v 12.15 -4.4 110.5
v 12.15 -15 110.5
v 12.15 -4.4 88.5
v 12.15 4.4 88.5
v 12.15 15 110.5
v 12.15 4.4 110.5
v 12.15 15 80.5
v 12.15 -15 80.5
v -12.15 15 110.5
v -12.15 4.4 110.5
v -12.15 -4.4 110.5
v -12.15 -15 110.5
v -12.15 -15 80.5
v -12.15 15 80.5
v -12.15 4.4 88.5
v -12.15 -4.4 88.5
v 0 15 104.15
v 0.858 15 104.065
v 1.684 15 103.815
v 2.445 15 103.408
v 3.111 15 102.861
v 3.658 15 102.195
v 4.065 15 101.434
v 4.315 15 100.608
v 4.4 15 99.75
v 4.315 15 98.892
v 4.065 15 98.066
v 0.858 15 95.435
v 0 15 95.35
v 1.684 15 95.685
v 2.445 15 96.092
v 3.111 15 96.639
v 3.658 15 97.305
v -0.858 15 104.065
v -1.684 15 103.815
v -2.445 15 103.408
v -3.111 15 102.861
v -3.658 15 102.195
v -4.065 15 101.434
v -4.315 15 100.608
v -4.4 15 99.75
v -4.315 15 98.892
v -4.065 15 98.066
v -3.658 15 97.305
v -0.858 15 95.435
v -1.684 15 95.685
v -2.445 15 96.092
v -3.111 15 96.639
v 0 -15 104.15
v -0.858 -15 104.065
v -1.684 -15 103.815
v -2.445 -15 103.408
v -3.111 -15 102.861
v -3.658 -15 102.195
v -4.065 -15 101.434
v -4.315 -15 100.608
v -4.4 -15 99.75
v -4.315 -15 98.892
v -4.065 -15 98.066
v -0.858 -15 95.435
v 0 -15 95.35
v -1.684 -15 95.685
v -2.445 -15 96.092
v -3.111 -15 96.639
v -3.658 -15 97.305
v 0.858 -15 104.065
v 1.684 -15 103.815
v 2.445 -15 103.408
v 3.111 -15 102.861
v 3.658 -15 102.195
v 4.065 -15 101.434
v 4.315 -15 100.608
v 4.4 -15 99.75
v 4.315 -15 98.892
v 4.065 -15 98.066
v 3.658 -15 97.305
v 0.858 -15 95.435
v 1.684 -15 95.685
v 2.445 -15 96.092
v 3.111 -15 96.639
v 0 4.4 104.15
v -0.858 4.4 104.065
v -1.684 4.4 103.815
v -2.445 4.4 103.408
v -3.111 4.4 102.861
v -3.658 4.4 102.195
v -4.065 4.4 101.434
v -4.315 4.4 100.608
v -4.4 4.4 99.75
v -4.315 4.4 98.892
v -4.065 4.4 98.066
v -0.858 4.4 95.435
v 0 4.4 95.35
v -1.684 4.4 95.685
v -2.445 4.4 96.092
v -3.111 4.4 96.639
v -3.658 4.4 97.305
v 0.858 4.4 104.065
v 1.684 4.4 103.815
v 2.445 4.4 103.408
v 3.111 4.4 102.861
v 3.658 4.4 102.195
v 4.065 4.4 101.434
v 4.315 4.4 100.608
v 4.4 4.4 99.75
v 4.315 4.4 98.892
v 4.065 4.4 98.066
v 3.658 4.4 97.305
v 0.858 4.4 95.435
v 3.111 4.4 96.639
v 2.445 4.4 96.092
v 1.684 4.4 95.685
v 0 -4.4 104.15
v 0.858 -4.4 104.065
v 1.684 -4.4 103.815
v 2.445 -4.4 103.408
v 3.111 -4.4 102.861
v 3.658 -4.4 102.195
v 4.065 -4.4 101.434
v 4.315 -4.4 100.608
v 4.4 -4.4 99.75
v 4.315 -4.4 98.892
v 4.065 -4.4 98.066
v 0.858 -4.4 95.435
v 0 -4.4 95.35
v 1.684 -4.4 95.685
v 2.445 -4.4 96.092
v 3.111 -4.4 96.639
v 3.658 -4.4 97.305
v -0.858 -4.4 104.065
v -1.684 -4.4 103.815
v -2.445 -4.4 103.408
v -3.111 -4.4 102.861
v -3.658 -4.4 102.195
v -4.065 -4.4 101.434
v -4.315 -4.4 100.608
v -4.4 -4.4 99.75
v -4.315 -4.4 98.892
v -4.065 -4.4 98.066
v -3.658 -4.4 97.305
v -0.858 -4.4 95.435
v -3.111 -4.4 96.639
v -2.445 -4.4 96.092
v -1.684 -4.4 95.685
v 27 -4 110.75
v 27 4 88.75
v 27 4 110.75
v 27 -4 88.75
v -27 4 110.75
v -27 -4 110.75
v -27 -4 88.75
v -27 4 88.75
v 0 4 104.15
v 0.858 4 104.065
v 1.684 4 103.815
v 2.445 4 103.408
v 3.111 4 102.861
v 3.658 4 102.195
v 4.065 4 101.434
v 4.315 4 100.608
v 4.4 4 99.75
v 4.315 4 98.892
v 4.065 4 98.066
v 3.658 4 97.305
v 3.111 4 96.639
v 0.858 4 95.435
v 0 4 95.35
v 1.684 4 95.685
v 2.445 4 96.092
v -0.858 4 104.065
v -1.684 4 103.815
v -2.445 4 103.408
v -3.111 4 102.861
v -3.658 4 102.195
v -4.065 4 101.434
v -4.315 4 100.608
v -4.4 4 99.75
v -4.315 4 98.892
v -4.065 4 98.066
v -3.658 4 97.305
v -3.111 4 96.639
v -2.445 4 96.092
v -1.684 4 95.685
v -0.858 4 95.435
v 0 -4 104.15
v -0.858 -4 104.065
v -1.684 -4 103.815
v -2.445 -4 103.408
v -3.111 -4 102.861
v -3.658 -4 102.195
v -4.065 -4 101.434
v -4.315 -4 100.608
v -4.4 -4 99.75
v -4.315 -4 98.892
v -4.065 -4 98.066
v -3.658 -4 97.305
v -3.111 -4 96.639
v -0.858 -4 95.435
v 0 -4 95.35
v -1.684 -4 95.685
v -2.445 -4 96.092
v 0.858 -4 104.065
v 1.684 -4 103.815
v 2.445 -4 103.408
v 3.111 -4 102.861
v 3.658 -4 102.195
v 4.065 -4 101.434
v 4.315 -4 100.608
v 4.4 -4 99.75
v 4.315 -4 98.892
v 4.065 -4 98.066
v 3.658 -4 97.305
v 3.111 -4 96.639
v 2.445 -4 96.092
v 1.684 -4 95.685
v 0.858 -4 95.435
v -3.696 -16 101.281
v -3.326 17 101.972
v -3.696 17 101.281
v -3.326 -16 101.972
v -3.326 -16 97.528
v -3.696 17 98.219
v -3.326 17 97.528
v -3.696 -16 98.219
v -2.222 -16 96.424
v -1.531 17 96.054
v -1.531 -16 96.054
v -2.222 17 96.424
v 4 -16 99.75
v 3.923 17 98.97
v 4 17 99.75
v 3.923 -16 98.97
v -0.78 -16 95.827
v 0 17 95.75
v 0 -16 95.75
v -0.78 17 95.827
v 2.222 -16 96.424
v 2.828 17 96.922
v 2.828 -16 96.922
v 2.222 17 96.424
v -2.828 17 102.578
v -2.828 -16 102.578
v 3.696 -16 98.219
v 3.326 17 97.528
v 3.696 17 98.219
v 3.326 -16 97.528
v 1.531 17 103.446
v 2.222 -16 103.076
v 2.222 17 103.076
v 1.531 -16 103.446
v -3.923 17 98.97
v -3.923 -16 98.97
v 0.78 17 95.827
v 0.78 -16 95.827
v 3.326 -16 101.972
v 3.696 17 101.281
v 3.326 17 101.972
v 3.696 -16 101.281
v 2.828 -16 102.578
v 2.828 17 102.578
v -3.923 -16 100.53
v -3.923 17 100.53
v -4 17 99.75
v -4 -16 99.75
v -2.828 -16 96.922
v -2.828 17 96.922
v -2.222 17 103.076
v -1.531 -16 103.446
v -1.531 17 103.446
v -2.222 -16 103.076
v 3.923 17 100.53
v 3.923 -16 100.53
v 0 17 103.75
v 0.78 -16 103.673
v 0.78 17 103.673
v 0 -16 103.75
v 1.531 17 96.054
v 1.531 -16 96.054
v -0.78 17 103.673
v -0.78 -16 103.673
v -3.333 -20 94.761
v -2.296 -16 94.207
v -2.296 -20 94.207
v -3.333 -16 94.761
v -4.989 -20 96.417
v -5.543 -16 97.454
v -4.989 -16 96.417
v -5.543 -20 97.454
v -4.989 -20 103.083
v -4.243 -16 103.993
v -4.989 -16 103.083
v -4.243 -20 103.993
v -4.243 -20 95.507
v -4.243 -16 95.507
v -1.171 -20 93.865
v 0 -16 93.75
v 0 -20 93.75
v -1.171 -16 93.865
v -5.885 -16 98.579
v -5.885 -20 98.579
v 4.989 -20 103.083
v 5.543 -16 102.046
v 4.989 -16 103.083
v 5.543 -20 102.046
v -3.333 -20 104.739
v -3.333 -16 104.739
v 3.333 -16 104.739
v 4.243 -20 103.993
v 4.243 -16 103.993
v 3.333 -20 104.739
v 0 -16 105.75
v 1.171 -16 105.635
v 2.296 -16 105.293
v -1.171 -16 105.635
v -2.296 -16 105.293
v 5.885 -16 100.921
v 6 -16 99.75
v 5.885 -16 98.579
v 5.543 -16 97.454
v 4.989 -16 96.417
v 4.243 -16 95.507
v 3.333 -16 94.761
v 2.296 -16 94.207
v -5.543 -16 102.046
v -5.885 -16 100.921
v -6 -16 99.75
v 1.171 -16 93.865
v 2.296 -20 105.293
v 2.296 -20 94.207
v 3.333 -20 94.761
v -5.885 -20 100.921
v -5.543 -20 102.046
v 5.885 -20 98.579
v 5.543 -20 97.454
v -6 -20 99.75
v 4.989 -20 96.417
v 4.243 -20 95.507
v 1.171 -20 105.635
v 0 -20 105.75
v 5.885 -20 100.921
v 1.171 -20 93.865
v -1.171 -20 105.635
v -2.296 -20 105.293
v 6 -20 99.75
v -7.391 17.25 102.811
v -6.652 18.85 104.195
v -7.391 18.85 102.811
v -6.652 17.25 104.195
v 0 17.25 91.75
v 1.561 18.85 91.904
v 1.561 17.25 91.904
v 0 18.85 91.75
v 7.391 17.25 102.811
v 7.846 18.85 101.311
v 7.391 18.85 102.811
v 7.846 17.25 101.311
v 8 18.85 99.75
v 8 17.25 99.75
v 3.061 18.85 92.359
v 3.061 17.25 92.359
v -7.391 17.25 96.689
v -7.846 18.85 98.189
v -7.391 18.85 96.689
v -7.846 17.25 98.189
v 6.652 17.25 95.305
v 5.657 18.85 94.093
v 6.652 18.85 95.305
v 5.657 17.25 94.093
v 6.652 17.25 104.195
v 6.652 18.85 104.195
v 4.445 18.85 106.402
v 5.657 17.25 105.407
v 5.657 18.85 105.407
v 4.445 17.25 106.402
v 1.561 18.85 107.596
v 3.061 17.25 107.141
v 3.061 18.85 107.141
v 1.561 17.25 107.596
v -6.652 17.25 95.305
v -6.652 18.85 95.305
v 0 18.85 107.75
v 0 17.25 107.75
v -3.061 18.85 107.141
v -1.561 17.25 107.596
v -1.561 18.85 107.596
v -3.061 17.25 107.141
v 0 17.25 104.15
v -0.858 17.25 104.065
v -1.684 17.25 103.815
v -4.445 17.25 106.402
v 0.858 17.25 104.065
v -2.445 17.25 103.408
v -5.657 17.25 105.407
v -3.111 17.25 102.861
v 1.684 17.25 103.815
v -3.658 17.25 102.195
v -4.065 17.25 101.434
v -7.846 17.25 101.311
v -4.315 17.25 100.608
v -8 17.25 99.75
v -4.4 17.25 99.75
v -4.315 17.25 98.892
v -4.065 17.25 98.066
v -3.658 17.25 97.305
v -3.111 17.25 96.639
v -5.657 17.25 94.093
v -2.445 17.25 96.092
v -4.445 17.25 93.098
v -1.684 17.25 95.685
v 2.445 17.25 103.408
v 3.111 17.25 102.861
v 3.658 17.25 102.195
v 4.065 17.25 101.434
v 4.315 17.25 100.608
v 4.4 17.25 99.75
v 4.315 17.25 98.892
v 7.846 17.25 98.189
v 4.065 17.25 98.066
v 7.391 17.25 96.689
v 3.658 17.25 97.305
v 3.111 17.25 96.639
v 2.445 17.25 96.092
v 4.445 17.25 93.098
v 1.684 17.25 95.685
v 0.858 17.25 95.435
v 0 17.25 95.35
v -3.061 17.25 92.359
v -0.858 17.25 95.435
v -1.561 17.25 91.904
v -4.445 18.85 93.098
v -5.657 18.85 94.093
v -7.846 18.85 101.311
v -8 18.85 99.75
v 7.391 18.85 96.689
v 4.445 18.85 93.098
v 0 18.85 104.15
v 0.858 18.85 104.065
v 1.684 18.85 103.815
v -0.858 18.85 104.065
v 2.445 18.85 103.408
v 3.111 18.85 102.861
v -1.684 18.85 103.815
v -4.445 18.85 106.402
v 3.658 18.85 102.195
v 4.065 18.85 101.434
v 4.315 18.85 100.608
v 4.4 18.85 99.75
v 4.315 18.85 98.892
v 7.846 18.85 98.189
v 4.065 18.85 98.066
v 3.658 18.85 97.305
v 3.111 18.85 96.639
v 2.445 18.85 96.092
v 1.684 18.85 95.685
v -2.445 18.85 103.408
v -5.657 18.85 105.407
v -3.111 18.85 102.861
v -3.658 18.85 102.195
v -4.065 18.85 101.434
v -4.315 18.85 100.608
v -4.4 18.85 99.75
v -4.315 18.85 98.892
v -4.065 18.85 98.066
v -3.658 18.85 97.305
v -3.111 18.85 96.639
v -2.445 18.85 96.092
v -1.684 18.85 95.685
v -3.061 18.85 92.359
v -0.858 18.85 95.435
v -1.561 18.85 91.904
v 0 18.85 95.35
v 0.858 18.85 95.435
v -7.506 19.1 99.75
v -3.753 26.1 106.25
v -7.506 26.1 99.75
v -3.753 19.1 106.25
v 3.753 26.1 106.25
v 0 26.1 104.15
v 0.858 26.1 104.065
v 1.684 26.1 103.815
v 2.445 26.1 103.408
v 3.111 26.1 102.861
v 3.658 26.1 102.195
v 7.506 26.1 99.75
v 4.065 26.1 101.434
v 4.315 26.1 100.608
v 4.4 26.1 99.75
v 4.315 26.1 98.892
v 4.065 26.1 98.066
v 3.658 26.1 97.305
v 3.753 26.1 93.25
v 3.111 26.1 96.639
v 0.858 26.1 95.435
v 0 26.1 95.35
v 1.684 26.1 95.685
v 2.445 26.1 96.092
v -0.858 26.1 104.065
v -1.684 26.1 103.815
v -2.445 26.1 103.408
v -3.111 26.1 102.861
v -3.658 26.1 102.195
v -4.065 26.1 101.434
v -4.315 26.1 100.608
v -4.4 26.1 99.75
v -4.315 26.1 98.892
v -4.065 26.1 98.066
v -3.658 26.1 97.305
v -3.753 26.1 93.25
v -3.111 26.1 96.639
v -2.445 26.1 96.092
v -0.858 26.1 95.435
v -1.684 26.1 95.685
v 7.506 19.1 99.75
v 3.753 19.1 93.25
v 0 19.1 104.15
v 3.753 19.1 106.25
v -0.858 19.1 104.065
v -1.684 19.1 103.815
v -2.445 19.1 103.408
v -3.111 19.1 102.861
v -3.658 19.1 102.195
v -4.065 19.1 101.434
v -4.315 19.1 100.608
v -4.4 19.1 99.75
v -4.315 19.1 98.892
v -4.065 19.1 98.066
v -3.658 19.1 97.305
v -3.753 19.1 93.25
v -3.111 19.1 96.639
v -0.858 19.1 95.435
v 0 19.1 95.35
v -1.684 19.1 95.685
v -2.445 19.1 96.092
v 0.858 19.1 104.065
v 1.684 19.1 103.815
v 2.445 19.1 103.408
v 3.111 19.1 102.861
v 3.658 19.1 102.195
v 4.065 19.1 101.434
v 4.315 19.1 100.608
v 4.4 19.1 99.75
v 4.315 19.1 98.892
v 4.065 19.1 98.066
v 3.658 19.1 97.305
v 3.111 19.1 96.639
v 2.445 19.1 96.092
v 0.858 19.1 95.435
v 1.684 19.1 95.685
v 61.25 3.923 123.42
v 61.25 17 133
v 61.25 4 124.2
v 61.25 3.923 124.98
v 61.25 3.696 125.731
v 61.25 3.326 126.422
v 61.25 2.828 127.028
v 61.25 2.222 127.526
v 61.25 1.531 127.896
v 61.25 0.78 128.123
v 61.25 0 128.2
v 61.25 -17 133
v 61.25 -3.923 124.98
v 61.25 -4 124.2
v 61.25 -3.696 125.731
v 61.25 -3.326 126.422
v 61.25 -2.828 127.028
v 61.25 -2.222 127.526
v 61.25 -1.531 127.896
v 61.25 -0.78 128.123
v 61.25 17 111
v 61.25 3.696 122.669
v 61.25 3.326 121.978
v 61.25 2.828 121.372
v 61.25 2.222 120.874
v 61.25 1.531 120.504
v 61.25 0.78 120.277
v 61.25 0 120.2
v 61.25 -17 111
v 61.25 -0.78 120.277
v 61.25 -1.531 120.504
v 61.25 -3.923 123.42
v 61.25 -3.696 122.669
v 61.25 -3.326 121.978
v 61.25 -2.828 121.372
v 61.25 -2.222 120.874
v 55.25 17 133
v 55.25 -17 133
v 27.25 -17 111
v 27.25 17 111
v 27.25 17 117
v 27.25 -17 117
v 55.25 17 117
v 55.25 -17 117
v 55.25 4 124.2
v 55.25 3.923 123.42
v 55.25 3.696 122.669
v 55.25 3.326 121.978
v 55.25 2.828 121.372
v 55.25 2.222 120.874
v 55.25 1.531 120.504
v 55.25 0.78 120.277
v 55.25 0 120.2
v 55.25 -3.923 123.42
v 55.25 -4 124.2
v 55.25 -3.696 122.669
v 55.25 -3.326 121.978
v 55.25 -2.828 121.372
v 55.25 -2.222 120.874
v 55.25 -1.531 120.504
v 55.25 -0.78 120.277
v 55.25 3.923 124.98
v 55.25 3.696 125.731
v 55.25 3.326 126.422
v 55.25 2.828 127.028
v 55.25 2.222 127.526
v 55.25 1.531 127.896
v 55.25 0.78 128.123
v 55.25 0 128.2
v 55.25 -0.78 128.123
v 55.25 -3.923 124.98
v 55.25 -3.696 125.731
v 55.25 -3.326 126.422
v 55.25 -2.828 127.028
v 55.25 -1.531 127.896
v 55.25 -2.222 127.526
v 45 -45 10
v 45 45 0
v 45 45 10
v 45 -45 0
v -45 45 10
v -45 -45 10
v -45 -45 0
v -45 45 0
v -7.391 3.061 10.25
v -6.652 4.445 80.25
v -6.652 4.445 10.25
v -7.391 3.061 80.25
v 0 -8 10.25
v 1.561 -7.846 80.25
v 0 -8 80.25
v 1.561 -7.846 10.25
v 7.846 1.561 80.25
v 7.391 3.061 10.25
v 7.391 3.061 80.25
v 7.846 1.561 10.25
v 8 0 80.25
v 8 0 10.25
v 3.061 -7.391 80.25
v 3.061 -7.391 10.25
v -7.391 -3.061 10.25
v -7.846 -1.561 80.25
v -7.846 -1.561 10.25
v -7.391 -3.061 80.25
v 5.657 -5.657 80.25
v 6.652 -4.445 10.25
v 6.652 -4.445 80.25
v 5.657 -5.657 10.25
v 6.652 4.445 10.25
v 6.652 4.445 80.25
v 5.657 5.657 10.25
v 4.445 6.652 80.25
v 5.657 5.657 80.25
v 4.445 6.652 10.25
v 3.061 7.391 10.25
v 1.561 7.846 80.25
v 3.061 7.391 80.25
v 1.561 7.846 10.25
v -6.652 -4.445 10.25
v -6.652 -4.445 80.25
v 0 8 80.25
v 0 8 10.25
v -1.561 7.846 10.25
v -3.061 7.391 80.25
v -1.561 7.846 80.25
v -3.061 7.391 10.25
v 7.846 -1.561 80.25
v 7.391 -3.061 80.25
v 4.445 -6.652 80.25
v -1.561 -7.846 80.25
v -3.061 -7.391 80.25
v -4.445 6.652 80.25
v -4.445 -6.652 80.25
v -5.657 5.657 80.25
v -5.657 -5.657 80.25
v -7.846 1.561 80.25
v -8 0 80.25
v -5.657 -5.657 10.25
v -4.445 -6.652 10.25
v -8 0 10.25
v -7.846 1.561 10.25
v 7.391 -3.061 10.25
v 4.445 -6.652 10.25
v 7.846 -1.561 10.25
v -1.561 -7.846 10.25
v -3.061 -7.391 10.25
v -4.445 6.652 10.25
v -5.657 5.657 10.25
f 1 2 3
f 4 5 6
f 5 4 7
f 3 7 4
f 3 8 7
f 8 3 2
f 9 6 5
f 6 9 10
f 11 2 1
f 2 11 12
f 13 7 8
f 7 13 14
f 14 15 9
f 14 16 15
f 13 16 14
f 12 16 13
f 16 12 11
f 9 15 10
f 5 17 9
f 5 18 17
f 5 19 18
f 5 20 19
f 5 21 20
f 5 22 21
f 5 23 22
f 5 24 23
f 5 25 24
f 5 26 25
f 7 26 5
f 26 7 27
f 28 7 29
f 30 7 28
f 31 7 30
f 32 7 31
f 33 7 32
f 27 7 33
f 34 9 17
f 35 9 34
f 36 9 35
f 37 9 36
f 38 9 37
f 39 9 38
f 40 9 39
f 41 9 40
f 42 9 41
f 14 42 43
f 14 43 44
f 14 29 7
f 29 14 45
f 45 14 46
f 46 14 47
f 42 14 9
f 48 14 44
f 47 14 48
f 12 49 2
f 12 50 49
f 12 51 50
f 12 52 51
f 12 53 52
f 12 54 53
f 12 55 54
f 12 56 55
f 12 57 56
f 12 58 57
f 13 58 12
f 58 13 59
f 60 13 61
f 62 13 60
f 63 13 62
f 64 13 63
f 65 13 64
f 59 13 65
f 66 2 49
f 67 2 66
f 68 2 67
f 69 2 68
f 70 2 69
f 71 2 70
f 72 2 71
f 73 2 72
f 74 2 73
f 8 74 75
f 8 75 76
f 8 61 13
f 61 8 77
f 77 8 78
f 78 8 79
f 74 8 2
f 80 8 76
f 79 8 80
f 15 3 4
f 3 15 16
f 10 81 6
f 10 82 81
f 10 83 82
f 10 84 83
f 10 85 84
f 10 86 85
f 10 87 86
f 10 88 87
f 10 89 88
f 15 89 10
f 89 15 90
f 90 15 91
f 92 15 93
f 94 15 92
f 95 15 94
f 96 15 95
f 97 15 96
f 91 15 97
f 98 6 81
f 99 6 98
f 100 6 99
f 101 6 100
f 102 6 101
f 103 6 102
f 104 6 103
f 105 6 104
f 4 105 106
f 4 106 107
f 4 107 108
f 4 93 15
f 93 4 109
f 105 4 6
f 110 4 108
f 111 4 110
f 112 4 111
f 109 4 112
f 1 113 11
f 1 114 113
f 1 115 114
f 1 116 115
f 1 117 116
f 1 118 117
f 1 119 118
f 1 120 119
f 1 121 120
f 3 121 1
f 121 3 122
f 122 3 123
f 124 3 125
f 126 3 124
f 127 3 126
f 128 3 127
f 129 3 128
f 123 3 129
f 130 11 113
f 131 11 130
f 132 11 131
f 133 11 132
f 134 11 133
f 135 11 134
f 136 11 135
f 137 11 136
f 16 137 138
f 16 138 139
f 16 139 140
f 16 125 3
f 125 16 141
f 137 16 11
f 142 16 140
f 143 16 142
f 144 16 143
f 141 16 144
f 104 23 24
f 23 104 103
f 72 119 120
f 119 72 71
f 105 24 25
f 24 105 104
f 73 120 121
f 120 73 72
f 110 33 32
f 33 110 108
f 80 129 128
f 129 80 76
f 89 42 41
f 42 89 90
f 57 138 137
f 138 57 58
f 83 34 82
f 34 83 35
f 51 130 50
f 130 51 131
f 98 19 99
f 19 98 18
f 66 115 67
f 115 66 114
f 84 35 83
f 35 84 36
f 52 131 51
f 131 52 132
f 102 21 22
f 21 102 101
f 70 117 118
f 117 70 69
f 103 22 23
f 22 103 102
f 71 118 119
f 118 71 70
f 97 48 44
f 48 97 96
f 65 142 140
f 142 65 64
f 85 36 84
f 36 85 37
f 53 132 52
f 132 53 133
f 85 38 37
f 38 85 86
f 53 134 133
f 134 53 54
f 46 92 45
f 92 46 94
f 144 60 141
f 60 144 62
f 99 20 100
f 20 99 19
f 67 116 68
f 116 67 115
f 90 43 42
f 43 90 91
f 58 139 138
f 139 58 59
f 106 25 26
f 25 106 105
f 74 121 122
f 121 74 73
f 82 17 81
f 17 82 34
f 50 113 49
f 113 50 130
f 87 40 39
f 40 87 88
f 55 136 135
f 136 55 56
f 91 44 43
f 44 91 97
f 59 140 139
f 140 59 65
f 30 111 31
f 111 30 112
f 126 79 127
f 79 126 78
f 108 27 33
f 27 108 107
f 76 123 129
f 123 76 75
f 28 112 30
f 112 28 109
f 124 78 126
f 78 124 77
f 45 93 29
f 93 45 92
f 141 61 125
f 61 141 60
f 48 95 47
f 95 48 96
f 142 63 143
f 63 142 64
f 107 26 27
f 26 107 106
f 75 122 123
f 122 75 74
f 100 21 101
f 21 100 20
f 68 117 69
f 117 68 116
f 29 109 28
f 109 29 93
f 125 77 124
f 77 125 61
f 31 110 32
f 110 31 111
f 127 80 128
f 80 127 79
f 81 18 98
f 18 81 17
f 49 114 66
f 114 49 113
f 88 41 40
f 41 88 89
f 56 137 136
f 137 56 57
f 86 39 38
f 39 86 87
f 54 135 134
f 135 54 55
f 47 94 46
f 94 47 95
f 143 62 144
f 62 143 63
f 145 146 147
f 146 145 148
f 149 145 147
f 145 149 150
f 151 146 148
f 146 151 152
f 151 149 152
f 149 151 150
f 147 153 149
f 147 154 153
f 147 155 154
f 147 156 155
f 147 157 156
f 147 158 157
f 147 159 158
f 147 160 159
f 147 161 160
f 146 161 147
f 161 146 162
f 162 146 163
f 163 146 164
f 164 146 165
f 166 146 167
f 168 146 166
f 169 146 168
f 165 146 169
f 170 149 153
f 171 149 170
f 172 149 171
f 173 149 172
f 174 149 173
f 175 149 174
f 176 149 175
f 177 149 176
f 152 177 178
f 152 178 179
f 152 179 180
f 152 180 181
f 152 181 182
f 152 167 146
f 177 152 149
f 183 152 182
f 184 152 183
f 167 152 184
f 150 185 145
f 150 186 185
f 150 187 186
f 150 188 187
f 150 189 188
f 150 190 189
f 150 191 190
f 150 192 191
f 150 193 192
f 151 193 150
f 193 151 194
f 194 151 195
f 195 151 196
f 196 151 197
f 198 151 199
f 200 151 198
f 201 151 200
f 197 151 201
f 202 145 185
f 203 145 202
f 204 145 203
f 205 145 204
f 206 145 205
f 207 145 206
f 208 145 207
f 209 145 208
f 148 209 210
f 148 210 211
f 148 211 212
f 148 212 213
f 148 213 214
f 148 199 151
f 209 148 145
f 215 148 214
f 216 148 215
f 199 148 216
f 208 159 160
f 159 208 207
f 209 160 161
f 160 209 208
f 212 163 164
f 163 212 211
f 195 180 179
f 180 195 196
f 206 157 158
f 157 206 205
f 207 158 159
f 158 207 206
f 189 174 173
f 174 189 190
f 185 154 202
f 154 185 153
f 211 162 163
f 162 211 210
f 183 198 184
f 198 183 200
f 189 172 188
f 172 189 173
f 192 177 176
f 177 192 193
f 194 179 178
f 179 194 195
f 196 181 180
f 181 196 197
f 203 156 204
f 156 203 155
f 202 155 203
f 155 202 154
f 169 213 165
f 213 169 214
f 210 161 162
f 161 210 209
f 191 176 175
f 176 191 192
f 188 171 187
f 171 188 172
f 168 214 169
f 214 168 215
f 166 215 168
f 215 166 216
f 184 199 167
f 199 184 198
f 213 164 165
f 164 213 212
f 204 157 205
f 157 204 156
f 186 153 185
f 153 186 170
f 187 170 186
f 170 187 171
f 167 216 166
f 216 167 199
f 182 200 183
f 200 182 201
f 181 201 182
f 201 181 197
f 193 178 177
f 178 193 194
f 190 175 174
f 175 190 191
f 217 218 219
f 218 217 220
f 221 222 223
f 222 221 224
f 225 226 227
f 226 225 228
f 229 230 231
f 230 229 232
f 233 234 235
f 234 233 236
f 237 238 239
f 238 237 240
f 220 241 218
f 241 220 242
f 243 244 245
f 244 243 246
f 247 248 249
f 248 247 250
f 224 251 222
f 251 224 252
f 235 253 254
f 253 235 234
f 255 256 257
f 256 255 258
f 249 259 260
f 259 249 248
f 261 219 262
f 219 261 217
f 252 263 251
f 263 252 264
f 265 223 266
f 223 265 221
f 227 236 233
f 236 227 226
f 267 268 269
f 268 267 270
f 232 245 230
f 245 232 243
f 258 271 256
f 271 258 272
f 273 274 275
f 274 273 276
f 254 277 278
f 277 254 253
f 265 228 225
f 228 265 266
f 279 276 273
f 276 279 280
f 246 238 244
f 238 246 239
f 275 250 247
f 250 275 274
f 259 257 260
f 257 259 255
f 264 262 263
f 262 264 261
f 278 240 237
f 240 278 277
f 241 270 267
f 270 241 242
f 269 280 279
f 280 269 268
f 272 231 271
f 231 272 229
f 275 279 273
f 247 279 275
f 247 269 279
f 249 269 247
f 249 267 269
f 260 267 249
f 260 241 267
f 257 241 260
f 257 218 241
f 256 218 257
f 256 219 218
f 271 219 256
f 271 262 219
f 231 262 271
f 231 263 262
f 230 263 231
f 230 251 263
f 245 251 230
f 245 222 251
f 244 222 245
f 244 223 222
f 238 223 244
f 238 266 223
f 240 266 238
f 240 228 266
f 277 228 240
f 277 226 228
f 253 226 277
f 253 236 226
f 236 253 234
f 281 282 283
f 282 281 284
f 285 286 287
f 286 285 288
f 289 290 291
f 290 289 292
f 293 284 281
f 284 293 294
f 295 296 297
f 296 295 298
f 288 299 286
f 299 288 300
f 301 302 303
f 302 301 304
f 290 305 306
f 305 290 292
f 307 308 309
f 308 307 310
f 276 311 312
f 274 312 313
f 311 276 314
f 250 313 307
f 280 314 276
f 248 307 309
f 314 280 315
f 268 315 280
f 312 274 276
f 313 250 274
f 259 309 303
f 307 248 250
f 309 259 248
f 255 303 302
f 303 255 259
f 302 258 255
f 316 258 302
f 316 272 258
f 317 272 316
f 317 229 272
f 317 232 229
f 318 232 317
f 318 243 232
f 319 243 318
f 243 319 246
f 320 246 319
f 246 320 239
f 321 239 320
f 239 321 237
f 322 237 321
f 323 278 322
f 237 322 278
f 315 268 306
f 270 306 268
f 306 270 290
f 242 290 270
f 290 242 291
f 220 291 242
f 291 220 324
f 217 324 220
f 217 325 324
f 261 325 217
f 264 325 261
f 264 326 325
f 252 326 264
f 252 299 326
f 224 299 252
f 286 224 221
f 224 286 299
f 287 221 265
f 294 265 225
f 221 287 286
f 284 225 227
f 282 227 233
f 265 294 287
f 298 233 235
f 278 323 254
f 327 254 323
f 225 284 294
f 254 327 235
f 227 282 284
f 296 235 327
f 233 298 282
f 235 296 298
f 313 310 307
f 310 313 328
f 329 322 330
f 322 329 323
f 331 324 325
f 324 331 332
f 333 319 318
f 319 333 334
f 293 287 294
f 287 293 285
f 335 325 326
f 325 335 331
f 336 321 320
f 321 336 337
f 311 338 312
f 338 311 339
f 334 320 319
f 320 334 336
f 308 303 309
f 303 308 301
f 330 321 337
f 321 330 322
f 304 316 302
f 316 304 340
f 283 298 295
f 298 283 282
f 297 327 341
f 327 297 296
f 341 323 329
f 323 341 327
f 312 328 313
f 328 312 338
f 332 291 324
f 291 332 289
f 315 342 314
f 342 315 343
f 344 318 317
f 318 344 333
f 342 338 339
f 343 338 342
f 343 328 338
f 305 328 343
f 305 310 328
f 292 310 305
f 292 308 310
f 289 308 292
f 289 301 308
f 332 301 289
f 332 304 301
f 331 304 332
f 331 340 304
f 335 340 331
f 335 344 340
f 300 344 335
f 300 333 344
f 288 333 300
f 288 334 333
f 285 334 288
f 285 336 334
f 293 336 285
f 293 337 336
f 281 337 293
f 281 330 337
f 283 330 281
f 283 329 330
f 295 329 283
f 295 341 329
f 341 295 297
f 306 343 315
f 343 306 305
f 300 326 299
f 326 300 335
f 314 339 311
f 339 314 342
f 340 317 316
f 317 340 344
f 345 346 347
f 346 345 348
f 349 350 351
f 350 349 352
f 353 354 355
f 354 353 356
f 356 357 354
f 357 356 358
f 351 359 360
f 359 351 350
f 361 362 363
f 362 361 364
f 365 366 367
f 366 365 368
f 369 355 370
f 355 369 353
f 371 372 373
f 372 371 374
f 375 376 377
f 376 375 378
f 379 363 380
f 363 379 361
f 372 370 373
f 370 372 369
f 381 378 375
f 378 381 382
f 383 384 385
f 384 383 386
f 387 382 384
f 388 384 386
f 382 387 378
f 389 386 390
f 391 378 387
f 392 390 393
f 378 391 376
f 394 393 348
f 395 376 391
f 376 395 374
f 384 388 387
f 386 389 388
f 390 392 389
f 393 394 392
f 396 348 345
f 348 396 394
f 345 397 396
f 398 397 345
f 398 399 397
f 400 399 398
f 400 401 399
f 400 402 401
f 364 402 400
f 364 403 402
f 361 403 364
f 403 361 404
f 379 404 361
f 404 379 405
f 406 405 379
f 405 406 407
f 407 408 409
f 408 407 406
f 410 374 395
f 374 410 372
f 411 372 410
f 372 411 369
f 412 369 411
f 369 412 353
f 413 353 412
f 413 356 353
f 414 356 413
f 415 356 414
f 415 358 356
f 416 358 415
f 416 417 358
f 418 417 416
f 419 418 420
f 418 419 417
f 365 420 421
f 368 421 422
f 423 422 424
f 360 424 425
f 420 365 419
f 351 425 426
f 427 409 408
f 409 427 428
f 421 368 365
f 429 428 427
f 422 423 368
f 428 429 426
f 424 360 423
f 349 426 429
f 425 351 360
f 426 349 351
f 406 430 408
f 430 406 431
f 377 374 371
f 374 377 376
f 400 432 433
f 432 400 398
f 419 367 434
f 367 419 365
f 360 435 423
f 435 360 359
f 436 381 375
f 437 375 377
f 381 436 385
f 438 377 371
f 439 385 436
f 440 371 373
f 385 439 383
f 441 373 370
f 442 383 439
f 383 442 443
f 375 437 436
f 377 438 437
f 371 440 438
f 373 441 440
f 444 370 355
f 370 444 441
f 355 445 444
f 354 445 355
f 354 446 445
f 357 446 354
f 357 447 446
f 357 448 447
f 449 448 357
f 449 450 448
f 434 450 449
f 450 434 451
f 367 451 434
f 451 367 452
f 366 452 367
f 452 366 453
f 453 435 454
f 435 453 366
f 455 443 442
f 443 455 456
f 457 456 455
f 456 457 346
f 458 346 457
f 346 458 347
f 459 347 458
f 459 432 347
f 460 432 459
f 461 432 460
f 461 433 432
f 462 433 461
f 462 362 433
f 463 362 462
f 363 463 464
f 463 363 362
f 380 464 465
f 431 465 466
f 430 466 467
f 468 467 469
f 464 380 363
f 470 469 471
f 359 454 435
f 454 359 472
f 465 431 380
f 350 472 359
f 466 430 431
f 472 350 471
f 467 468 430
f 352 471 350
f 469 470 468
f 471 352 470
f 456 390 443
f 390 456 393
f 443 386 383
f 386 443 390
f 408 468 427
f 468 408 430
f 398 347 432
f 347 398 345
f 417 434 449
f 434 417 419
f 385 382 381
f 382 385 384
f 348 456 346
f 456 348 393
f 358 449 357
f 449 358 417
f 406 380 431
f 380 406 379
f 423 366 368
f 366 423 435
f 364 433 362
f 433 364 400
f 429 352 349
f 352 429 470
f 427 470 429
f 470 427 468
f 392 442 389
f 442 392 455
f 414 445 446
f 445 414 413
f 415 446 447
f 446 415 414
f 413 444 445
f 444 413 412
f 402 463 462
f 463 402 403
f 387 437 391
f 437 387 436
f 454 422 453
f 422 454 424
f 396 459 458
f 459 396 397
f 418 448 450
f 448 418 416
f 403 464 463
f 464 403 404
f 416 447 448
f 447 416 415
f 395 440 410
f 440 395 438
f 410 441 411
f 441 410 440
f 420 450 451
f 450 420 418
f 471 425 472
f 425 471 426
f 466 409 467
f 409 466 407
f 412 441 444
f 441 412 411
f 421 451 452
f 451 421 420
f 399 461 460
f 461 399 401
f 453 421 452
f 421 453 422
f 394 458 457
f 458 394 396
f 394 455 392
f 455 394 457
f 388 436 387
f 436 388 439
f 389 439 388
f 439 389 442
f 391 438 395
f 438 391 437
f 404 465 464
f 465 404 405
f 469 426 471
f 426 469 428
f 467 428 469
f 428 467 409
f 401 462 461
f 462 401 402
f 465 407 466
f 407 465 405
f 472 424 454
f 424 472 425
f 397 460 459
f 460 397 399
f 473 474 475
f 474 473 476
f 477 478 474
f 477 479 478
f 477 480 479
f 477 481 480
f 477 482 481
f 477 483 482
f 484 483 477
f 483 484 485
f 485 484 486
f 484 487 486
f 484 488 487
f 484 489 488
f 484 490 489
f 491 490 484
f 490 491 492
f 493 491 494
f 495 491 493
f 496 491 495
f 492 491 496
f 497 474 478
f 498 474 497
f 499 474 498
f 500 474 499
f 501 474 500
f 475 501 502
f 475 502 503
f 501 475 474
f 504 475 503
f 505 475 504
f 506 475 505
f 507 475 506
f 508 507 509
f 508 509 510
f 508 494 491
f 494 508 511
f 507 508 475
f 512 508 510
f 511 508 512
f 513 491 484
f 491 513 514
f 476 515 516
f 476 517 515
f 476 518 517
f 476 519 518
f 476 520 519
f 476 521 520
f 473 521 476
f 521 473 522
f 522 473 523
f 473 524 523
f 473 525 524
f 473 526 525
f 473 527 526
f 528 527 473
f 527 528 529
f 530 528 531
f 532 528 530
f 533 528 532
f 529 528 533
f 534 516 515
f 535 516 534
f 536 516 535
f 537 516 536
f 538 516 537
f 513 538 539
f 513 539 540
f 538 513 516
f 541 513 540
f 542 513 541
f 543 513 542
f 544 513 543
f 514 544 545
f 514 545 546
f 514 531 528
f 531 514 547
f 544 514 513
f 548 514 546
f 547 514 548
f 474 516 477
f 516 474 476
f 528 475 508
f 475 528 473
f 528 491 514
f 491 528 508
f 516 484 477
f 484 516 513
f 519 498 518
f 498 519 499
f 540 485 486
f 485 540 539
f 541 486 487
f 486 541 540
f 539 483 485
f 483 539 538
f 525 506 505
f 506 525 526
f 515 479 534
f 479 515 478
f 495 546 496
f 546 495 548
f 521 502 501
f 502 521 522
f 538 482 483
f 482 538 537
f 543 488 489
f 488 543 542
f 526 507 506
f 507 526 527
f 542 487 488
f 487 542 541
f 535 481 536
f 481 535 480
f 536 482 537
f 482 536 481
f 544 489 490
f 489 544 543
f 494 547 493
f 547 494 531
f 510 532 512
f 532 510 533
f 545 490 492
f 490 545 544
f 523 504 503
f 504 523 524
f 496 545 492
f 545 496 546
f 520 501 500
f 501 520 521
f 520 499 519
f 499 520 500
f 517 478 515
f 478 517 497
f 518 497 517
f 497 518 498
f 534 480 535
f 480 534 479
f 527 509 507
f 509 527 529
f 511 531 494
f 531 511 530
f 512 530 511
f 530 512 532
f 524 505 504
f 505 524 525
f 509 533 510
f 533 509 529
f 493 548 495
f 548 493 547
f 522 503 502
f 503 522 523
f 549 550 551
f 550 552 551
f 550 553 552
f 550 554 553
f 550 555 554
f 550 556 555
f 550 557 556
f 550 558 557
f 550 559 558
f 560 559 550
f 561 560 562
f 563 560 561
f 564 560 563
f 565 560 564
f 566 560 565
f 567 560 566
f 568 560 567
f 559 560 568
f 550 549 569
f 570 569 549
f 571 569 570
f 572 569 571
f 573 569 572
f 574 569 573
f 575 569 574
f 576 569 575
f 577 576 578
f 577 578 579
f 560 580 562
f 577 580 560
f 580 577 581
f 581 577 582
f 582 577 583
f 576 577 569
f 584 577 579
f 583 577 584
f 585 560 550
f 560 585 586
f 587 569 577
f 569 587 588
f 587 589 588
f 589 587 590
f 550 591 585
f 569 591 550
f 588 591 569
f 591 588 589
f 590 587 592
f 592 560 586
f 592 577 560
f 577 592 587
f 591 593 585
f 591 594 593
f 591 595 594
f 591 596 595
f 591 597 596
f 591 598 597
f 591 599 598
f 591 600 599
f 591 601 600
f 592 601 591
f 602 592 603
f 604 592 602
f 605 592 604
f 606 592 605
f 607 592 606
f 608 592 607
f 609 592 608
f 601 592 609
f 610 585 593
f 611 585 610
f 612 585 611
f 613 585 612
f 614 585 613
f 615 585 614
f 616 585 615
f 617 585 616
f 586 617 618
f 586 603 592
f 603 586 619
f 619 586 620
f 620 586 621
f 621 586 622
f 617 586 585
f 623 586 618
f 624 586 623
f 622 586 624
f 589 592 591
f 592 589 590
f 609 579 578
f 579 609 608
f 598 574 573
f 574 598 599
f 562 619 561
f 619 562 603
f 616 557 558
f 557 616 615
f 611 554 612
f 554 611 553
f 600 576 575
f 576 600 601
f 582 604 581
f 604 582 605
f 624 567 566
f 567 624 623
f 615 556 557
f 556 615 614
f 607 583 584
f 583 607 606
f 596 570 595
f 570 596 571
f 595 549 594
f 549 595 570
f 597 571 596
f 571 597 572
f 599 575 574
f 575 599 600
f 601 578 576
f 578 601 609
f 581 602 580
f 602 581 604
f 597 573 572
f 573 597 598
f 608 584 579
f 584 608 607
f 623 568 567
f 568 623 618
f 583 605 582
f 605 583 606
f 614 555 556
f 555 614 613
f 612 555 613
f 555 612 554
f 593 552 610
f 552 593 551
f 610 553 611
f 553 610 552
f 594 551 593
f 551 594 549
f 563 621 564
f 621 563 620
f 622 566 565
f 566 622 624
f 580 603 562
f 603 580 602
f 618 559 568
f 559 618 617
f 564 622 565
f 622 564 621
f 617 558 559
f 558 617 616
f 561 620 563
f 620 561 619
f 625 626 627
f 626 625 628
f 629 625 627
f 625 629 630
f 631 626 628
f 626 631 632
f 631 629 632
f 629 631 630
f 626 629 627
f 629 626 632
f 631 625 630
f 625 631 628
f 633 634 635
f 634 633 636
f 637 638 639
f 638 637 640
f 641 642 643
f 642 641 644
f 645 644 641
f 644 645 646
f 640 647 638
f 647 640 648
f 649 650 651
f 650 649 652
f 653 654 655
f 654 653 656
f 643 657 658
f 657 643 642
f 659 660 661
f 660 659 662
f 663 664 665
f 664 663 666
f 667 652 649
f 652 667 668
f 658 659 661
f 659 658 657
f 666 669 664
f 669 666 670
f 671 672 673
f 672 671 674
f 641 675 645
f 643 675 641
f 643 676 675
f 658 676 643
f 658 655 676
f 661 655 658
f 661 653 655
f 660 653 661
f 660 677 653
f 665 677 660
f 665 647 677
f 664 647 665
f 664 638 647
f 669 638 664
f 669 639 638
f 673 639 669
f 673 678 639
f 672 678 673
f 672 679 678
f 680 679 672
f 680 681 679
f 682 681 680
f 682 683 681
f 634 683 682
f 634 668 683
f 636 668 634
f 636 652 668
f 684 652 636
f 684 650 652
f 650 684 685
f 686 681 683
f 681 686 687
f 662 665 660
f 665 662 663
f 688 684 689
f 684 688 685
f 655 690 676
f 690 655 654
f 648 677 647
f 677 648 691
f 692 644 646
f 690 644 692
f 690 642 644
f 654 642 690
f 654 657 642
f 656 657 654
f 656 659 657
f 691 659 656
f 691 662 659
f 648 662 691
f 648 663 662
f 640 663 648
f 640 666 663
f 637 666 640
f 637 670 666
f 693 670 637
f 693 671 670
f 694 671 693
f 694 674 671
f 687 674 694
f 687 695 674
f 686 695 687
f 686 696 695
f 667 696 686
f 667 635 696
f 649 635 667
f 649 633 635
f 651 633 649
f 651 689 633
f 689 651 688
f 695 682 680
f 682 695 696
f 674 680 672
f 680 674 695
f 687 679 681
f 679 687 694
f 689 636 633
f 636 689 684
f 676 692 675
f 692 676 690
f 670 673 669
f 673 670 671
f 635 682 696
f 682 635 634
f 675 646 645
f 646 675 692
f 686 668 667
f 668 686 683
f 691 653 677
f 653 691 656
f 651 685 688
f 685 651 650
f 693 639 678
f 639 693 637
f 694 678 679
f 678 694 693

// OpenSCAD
$fn = 32;

// ------------------------------------------------------------------------
// Lamp arm: column d16 x 70 mm, arm 54 mm
// Every part is its own module, assembly() places every instance.
// ------------------------------------------------------------------------

// --- part 1 ---
module lamp_base() {
  difference() {
    translate([-45, -45, 0]) cube([90, 90, 10]);
  }
}

// --- part 2 ---
module lamp_column() {
  cylinder(h = 70, d = 16);
}

// --- part 3 ---
module head_fork() {
  difference() {
    translate([-12.15, -15, 0]) cube([24.3, 30, 30]);
    translate([-13.15, -4.4, 8]) cube([26.3, 8.8, 23]);
    translate([0, 0, 19.25]) rotate([90, 0, 0]) cylinder(h = 32, d = 8.8, center = true);
  }
}

// --- part 4 ---
module lamp_arm() {
  difference() {
    translate([-27, -4, 0]) cube([54, 8, 22]);
    translate([0, 0, 11]) rotate([90, 0, 0]) cylinder(h = 10, d = 8.8, center = true);
  }
}

// --- part 5 ---
module arm_pin() {
  rotate([0, 90, 0]) cylinder(h = 34, d = 8, center = true);
  translate([-20, 0, 0]) rotate([0, 90, 0]) cylinder(h = 4, d = 12);
}

// --- part 6 ---
module arm_washer() {
  difference() {
      translate([0, 0, 0]) cylinder(h = 1.6, d = 16);
      translate([0, 0, -1]) cylinder(h = 3.6, d = 8.8);
    }
}

// --- part 7 ---
module arm_nut() {
  difference() {
    linear_extrude(height = 7) polygon(points = [[7.506, 0], [3.753, 6.5], [-3.753, 6.5], [-7.506, 0], [-3.753, -6.5], [3.753, -6.5]]);
    translate([0, 0, -1]) cylinder(h = 9, d = 8.8);
  }
}

// --- part 8 ---
module shade_bracket() {
  difference() {
    translate([-17, -17, 0]) cube([34, 34, 22]);
    translate([-18, -18, 6]) cube([29, 36, 17]);
    translate([14, 0, 13.2]) rotate([0, 90, 0]) cylinder(h = 8, d = 8, center = true);
  }
}

// --- assembly ---
module assembly() {
  color([0.80, 0.24, 0.20]) translate([0, 0, 0]) rotate([0, 0, 0]) lamp_base();
  color([0.20, 0.45, 0.75]) translate([0, 0, 10.25]) rotate([0, 0, 0]) lamp_column();
  color([0.25, 0.62, 0.32]) translate([0, 0, 80.5]) rotate([0, 0, 0]) head_fork();
  color([0.92, 0.70, 0.18]) translate([0, 0, 88.75]) rotate([0, 0, 0]) lamp_arm();
  color([0.58, 0.35, 0.70]) translate([0, 0, 99.75]) rotate([0, 0, 90]) arm_pin();
  color([0.16, 0.66, 0.66]) translate([0, 18.85, 99.75]) rotate([90, 0, 0]) arm_washer();
  color([0.85, 0.48, 0.18]) translate([0, 26.1, 99.75]) rotate([90, 0, 0]) arm_nut();
  color([0.55, 0.60, 0.65]) translate([44.25, 0, 111]) rotate([0, 0, 0]) shade_bracket();
}

assembly();
